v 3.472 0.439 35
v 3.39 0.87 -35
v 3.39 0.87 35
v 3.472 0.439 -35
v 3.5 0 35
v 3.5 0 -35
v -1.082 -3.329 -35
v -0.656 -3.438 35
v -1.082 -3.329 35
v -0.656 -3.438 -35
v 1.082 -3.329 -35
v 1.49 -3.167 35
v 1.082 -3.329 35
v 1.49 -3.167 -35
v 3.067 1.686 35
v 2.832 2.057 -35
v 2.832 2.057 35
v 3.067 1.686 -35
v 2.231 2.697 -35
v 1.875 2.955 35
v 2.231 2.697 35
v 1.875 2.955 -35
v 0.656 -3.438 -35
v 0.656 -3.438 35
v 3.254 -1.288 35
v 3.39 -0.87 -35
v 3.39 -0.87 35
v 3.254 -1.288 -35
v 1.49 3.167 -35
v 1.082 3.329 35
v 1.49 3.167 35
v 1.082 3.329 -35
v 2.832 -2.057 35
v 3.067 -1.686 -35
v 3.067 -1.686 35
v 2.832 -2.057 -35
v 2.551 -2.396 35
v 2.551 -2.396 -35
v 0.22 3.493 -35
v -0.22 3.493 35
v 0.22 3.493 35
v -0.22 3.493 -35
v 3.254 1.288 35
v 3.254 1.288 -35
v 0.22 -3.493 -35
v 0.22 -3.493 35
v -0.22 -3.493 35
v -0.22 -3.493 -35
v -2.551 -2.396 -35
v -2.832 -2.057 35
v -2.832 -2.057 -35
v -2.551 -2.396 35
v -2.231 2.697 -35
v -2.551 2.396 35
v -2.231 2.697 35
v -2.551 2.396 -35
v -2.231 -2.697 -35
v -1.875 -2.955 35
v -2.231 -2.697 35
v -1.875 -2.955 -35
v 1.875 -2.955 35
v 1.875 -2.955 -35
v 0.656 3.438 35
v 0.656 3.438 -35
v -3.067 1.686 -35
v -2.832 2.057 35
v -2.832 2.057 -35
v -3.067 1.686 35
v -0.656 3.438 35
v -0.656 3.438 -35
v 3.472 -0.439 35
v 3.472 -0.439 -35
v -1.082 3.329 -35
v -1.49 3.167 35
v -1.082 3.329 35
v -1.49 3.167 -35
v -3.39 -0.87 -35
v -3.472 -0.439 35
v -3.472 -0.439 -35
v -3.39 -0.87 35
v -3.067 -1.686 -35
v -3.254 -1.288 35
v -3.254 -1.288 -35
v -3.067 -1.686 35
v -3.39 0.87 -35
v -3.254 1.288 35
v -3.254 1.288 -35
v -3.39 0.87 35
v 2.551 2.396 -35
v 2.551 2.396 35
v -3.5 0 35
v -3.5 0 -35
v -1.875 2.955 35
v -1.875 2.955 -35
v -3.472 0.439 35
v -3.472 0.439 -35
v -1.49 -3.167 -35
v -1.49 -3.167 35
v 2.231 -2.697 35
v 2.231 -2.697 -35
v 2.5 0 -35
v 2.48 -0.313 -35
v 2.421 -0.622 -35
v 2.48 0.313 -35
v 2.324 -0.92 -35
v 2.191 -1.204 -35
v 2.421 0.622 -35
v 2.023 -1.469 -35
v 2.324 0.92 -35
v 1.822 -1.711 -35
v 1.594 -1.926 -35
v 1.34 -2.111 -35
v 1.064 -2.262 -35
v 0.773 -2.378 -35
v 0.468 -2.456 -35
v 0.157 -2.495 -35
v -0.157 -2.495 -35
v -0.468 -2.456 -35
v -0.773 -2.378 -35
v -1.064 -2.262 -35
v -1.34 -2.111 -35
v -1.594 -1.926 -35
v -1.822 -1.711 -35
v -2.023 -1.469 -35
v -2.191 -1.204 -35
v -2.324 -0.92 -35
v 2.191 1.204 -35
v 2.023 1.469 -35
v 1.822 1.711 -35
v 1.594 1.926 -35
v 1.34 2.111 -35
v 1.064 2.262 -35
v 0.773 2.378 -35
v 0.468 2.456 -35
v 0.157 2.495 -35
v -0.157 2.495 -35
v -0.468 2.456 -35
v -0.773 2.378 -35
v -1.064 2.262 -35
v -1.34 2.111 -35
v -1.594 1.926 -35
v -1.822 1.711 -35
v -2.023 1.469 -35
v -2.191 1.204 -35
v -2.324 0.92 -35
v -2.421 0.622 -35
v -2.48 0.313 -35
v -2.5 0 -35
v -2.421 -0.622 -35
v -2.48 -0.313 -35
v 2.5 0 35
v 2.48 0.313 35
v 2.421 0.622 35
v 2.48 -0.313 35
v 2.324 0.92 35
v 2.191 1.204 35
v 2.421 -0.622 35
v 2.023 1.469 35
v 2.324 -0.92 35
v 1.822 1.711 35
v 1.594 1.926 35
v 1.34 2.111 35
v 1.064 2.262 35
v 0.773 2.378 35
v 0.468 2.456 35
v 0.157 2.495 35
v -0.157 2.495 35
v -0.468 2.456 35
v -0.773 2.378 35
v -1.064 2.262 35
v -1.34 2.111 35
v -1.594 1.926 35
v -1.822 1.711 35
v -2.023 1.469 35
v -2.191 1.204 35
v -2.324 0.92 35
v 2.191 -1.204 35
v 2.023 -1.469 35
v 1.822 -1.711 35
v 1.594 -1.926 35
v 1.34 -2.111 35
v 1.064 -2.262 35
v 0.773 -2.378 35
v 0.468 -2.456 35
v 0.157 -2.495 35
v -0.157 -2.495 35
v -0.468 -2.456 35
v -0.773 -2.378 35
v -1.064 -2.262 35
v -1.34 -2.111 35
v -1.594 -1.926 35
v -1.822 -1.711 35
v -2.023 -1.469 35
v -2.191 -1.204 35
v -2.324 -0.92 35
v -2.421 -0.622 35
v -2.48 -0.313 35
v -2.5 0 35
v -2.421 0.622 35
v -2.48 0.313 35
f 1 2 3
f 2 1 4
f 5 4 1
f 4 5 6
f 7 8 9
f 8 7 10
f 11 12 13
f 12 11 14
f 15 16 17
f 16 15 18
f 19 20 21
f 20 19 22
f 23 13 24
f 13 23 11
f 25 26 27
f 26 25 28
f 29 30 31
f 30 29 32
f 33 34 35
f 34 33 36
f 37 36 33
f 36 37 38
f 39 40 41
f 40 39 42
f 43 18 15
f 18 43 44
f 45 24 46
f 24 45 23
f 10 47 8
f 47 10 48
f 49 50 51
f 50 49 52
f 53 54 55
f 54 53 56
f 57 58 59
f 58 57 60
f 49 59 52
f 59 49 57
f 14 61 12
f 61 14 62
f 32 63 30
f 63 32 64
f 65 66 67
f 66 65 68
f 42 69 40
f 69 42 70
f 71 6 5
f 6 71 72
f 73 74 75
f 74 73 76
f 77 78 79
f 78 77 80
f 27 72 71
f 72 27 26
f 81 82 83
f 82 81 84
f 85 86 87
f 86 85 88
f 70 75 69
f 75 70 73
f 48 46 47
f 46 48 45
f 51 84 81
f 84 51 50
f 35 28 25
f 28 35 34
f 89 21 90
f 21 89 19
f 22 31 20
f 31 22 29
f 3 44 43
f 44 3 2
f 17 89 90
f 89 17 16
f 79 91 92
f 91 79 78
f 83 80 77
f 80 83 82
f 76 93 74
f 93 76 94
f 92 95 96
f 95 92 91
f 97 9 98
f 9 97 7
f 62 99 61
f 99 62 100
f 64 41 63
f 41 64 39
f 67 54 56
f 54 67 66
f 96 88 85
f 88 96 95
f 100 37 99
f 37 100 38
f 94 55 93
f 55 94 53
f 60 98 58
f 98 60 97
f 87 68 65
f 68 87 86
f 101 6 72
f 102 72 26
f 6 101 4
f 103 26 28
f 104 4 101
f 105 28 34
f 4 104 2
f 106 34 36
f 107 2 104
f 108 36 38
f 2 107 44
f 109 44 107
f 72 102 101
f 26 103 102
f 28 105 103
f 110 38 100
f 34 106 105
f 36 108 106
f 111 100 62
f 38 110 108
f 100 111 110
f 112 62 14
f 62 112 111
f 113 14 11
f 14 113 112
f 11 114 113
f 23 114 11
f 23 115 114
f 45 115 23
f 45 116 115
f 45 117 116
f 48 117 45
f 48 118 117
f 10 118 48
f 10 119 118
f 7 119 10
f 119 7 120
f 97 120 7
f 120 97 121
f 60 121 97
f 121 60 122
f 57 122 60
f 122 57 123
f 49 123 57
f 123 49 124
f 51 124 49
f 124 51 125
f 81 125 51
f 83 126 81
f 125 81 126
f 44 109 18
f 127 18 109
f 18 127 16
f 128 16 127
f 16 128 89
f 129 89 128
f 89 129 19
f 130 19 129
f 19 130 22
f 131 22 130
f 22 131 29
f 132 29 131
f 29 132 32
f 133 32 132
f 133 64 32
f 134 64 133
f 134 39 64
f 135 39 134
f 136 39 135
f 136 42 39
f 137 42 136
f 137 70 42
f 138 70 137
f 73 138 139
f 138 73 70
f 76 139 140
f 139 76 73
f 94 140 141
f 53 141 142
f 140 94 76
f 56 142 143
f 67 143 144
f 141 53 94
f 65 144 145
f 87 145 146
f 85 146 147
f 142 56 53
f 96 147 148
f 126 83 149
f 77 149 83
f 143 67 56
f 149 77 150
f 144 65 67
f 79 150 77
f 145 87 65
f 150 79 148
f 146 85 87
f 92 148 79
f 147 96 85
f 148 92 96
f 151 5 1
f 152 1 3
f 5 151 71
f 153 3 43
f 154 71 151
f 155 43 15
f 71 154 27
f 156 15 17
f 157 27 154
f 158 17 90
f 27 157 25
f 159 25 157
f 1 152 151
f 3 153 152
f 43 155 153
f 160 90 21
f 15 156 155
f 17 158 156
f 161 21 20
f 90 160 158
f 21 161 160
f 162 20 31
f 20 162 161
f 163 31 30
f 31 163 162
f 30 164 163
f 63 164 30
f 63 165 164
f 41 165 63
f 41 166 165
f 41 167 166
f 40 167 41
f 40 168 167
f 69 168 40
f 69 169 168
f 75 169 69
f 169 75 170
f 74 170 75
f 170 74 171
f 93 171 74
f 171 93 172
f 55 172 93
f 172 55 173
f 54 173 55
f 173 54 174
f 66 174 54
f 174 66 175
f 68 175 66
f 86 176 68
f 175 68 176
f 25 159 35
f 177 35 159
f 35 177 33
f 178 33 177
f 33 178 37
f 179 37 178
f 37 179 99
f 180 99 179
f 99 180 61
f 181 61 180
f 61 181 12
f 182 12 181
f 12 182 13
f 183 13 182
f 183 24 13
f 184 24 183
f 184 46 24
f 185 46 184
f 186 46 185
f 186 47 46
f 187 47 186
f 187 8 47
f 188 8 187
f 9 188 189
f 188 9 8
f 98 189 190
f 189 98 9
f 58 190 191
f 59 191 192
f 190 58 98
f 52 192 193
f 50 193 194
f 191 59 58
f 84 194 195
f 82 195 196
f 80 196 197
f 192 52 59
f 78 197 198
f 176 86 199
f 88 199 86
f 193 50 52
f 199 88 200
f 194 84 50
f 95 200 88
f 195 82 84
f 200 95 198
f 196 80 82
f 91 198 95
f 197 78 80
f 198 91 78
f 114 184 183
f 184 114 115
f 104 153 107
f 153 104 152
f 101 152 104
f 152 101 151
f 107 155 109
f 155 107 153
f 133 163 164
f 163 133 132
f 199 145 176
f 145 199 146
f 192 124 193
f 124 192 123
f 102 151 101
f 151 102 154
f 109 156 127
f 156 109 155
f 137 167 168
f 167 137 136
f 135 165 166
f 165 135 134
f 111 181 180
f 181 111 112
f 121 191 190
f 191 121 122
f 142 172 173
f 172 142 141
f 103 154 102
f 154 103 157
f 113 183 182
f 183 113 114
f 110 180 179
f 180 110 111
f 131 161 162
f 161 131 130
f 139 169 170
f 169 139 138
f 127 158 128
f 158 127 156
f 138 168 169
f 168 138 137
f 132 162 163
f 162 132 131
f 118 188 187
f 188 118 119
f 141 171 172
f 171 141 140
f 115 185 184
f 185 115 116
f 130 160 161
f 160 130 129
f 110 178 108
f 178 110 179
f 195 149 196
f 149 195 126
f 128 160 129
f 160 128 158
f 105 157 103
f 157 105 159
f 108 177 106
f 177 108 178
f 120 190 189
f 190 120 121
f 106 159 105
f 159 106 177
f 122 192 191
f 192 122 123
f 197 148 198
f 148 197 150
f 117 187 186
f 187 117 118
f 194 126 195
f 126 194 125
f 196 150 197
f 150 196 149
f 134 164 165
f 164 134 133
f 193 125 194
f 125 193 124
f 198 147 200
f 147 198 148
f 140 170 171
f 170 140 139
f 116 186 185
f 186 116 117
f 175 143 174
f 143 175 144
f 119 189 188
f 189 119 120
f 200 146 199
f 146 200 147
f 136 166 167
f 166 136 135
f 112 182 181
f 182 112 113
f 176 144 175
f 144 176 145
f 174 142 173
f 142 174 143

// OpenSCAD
$fn = 50;


difference() {
	union() {
		translate(v = [0, 0, -35.0000000000]) {
			cylinder(h = 70, r = 3.5000000000);
		}
	}
	union() {
		translate(v = [0, 0, -100.0000000000]) {
			cylinder(h = 200, r = 2.5000000000);
		}
	}
}
